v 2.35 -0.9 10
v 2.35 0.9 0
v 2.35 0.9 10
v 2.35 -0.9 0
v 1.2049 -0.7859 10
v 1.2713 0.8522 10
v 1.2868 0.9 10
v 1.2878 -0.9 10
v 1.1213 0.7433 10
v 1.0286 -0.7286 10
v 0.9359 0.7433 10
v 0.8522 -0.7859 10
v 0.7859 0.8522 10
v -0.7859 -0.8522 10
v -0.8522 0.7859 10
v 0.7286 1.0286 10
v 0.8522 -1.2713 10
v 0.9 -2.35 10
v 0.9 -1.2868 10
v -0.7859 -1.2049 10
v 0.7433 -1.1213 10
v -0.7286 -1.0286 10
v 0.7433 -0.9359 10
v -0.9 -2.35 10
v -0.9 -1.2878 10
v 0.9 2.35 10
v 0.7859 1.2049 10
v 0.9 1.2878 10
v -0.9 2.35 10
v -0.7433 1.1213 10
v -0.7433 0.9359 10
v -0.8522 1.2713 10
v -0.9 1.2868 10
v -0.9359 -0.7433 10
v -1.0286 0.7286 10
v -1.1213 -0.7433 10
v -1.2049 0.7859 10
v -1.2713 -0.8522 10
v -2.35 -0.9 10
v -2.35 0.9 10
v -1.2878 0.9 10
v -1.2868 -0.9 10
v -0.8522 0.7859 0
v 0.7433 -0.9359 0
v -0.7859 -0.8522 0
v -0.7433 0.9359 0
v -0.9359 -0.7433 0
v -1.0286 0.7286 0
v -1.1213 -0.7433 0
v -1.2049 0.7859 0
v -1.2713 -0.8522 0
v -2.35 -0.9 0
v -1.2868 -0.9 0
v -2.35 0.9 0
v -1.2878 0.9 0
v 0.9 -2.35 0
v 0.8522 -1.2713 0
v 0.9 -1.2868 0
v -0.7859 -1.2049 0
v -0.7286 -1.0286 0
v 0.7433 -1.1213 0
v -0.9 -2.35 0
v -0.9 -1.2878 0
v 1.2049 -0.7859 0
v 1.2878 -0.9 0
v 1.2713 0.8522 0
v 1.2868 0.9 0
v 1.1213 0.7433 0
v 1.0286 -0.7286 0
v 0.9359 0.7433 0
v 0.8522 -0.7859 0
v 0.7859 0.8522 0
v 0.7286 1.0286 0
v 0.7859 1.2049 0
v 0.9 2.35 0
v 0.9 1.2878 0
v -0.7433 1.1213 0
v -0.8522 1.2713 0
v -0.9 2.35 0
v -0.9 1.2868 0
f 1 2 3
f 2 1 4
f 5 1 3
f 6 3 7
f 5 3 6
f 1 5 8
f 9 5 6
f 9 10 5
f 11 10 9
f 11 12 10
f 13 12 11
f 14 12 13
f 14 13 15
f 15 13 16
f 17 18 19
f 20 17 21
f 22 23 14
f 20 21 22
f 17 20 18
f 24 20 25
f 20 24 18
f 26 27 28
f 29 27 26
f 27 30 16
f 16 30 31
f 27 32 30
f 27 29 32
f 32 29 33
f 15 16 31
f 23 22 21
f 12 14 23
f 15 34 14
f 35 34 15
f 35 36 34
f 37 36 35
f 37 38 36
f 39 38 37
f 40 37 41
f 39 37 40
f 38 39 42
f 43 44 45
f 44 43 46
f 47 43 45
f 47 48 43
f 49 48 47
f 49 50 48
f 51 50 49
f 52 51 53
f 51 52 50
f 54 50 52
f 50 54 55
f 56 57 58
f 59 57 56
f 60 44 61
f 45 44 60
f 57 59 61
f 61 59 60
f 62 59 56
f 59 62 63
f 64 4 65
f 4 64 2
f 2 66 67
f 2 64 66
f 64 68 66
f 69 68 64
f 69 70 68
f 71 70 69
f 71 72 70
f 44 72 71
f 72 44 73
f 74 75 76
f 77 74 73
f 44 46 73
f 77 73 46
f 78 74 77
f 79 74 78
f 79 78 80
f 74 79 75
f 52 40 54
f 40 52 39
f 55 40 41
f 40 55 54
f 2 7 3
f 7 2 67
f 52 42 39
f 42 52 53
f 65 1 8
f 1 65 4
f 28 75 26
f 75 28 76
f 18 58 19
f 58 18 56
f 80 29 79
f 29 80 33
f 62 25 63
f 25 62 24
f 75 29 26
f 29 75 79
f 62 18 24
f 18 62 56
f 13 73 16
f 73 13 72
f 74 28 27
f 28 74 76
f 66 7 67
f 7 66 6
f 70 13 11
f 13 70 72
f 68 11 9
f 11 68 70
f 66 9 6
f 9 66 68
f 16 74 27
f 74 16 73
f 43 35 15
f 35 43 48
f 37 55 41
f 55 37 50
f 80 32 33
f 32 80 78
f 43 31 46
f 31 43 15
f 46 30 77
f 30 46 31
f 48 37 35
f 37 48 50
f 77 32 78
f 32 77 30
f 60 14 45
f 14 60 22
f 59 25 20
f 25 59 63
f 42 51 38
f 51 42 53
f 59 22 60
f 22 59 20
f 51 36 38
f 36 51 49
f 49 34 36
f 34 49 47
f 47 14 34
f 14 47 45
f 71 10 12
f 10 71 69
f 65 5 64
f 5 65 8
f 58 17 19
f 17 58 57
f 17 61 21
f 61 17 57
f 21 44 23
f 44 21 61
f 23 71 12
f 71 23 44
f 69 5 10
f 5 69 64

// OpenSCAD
// from http://www.thingiverse.com/thing:35353

axle_spline_width = 2.0 - 0.2;
axle_diameter = 4.8 - 0.1;
axle_inner_keyhole_radius = 0.3; //keyhole the corners to try and make them square when printed

module lego_axle(height) {
  translate([0,0,height/2])
    difference() {
      union() {
        cube([axle_diameter,axle_spline_width,height],center=true);
        cube([axle_spline_width,axle_diameter,height],center=true);
      }//union
      for (A=[0,90,180,270]) {
        rotate([0,0,A]) {
          translate([axle_spline_width/1.75,axle_spline_width/1.75,0])
            cylinder(h=height+0.01,r=axle_inner_keyhole_radius,center=true, $fs=0.2);
      }
    }
  }
}

// Testing
echo("##########");
echo("In lego_axle.scad");
echo("This file should not be included, use ''use <filemane>'' instead.");
echo("##########");

p = 1;
nLayer = 1;
if (p==1) {
  lego_axle(10);
}
